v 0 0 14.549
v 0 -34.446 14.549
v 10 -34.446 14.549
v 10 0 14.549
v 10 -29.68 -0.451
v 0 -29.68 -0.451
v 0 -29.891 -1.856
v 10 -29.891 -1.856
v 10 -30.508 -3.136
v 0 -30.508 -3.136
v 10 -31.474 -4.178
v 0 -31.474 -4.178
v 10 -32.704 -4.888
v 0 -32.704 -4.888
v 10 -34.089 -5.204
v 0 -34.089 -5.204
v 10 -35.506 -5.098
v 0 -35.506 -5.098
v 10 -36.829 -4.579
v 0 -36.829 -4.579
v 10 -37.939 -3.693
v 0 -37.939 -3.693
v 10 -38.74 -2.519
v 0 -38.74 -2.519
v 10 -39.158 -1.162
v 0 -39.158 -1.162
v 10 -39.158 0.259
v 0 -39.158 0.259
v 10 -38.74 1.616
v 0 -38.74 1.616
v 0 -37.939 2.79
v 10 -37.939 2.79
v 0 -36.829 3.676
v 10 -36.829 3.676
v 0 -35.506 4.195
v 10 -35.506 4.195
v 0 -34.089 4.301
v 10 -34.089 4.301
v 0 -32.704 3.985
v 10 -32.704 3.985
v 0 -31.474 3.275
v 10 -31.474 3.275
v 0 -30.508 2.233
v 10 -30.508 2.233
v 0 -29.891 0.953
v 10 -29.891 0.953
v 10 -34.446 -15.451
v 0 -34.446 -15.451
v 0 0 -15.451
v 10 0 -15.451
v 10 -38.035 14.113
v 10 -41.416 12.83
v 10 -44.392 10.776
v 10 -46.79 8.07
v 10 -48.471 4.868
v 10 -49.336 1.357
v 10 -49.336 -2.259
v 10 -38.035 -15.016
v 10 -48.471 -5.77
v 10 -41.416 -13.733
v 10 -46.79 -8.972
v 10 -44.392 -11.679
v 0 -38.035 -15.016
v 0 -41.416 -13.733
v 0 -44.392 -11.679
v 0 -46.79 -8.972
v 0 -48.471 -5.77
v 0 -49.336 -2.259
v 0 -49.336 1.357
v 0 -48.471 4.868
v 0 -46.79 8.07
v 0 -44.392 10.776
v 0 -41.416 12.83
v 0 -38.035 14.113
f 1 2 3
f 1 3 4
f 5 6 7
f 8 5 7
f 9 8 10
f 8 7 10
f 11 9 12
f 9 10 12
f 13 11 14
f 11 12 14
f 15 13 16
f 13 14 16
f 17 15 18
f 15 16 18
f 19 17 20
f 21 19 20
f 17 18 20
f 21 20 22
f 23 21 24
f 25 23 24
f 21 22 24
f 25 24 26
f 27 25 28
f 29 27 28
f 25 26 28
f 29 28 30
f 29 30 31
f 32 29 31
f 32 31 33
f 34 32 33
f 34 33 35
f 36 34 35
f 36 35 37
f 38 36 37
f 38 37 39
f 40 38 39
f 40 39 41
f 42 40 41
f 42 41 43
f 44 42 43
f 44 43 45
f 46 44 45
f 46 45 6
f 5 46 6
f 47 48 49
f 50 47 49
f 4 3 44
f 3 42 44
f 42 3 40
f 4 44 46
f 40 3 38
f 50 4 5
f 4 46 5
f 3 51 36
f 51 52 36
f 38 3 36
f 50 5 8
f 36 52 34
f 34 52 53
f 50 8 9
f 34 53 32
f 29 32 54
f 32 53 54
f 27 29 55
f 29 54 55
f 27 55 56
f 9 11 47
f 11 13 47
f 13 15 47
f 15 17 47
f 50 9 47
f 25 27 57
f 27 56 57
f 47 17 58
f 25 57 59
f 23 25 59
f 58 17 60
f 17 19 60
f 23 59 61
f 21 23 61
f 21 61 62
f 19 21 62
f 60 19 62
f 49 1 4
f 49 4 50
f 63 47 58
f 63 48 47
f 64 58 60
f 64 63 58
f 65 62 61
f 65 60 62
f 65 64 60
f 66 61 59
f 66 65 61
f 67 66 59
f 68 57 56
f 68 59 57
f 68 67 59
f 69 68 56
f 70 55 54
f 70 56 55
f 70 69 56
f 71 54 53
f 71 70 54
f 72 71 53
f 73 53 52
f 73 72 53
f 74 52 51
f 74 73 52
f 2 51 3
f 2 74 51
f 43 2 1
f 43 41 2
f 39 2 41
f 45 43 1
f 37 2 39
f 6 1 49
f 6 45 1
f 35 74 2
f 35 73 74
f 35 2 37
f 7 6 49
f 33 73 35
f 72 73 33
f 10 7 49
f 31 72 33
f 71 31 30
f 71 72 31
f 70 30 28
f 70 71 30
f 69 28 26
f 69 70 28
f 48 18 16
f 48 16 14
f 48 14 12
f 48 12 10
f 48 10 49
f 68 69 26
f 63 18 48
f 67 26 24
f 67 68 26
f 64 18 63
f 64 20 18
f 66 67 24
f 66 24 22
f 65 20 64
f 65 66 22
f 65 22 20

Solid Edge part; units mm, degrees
sketch "Sketch1" plane through (0, 0, 0) normal (1, 0, 0) x (0, 1, 0)
  line L0 (-34.4456, 14.5486) -> (0, 14.5486)
  line L1 (0, 14.5486) -> (0, -15.4514)
  line L2 (-34.4456, -15.4514) -> (0, -15.4514)
  arc A0 (-34.4456, 14.5486) -> (-34.4456, -15.4514) centre (-34.4456, -0.4514) ccw
extrude "Protrusion1" add sketch "Sketch1" along normal blind 10
sketch "Sketch2" plane through (0, 0, 0) normal (1, 0, 0) x (0, 1, 0)
  circle A0 centre (-34.4456, -0.4514) radius 4.7659
  dimension "D1" = 34.4456
  dimension "D2" = 15
extrude "Cutout1" cut sketch "Sketch2" along normal blind 53.975
